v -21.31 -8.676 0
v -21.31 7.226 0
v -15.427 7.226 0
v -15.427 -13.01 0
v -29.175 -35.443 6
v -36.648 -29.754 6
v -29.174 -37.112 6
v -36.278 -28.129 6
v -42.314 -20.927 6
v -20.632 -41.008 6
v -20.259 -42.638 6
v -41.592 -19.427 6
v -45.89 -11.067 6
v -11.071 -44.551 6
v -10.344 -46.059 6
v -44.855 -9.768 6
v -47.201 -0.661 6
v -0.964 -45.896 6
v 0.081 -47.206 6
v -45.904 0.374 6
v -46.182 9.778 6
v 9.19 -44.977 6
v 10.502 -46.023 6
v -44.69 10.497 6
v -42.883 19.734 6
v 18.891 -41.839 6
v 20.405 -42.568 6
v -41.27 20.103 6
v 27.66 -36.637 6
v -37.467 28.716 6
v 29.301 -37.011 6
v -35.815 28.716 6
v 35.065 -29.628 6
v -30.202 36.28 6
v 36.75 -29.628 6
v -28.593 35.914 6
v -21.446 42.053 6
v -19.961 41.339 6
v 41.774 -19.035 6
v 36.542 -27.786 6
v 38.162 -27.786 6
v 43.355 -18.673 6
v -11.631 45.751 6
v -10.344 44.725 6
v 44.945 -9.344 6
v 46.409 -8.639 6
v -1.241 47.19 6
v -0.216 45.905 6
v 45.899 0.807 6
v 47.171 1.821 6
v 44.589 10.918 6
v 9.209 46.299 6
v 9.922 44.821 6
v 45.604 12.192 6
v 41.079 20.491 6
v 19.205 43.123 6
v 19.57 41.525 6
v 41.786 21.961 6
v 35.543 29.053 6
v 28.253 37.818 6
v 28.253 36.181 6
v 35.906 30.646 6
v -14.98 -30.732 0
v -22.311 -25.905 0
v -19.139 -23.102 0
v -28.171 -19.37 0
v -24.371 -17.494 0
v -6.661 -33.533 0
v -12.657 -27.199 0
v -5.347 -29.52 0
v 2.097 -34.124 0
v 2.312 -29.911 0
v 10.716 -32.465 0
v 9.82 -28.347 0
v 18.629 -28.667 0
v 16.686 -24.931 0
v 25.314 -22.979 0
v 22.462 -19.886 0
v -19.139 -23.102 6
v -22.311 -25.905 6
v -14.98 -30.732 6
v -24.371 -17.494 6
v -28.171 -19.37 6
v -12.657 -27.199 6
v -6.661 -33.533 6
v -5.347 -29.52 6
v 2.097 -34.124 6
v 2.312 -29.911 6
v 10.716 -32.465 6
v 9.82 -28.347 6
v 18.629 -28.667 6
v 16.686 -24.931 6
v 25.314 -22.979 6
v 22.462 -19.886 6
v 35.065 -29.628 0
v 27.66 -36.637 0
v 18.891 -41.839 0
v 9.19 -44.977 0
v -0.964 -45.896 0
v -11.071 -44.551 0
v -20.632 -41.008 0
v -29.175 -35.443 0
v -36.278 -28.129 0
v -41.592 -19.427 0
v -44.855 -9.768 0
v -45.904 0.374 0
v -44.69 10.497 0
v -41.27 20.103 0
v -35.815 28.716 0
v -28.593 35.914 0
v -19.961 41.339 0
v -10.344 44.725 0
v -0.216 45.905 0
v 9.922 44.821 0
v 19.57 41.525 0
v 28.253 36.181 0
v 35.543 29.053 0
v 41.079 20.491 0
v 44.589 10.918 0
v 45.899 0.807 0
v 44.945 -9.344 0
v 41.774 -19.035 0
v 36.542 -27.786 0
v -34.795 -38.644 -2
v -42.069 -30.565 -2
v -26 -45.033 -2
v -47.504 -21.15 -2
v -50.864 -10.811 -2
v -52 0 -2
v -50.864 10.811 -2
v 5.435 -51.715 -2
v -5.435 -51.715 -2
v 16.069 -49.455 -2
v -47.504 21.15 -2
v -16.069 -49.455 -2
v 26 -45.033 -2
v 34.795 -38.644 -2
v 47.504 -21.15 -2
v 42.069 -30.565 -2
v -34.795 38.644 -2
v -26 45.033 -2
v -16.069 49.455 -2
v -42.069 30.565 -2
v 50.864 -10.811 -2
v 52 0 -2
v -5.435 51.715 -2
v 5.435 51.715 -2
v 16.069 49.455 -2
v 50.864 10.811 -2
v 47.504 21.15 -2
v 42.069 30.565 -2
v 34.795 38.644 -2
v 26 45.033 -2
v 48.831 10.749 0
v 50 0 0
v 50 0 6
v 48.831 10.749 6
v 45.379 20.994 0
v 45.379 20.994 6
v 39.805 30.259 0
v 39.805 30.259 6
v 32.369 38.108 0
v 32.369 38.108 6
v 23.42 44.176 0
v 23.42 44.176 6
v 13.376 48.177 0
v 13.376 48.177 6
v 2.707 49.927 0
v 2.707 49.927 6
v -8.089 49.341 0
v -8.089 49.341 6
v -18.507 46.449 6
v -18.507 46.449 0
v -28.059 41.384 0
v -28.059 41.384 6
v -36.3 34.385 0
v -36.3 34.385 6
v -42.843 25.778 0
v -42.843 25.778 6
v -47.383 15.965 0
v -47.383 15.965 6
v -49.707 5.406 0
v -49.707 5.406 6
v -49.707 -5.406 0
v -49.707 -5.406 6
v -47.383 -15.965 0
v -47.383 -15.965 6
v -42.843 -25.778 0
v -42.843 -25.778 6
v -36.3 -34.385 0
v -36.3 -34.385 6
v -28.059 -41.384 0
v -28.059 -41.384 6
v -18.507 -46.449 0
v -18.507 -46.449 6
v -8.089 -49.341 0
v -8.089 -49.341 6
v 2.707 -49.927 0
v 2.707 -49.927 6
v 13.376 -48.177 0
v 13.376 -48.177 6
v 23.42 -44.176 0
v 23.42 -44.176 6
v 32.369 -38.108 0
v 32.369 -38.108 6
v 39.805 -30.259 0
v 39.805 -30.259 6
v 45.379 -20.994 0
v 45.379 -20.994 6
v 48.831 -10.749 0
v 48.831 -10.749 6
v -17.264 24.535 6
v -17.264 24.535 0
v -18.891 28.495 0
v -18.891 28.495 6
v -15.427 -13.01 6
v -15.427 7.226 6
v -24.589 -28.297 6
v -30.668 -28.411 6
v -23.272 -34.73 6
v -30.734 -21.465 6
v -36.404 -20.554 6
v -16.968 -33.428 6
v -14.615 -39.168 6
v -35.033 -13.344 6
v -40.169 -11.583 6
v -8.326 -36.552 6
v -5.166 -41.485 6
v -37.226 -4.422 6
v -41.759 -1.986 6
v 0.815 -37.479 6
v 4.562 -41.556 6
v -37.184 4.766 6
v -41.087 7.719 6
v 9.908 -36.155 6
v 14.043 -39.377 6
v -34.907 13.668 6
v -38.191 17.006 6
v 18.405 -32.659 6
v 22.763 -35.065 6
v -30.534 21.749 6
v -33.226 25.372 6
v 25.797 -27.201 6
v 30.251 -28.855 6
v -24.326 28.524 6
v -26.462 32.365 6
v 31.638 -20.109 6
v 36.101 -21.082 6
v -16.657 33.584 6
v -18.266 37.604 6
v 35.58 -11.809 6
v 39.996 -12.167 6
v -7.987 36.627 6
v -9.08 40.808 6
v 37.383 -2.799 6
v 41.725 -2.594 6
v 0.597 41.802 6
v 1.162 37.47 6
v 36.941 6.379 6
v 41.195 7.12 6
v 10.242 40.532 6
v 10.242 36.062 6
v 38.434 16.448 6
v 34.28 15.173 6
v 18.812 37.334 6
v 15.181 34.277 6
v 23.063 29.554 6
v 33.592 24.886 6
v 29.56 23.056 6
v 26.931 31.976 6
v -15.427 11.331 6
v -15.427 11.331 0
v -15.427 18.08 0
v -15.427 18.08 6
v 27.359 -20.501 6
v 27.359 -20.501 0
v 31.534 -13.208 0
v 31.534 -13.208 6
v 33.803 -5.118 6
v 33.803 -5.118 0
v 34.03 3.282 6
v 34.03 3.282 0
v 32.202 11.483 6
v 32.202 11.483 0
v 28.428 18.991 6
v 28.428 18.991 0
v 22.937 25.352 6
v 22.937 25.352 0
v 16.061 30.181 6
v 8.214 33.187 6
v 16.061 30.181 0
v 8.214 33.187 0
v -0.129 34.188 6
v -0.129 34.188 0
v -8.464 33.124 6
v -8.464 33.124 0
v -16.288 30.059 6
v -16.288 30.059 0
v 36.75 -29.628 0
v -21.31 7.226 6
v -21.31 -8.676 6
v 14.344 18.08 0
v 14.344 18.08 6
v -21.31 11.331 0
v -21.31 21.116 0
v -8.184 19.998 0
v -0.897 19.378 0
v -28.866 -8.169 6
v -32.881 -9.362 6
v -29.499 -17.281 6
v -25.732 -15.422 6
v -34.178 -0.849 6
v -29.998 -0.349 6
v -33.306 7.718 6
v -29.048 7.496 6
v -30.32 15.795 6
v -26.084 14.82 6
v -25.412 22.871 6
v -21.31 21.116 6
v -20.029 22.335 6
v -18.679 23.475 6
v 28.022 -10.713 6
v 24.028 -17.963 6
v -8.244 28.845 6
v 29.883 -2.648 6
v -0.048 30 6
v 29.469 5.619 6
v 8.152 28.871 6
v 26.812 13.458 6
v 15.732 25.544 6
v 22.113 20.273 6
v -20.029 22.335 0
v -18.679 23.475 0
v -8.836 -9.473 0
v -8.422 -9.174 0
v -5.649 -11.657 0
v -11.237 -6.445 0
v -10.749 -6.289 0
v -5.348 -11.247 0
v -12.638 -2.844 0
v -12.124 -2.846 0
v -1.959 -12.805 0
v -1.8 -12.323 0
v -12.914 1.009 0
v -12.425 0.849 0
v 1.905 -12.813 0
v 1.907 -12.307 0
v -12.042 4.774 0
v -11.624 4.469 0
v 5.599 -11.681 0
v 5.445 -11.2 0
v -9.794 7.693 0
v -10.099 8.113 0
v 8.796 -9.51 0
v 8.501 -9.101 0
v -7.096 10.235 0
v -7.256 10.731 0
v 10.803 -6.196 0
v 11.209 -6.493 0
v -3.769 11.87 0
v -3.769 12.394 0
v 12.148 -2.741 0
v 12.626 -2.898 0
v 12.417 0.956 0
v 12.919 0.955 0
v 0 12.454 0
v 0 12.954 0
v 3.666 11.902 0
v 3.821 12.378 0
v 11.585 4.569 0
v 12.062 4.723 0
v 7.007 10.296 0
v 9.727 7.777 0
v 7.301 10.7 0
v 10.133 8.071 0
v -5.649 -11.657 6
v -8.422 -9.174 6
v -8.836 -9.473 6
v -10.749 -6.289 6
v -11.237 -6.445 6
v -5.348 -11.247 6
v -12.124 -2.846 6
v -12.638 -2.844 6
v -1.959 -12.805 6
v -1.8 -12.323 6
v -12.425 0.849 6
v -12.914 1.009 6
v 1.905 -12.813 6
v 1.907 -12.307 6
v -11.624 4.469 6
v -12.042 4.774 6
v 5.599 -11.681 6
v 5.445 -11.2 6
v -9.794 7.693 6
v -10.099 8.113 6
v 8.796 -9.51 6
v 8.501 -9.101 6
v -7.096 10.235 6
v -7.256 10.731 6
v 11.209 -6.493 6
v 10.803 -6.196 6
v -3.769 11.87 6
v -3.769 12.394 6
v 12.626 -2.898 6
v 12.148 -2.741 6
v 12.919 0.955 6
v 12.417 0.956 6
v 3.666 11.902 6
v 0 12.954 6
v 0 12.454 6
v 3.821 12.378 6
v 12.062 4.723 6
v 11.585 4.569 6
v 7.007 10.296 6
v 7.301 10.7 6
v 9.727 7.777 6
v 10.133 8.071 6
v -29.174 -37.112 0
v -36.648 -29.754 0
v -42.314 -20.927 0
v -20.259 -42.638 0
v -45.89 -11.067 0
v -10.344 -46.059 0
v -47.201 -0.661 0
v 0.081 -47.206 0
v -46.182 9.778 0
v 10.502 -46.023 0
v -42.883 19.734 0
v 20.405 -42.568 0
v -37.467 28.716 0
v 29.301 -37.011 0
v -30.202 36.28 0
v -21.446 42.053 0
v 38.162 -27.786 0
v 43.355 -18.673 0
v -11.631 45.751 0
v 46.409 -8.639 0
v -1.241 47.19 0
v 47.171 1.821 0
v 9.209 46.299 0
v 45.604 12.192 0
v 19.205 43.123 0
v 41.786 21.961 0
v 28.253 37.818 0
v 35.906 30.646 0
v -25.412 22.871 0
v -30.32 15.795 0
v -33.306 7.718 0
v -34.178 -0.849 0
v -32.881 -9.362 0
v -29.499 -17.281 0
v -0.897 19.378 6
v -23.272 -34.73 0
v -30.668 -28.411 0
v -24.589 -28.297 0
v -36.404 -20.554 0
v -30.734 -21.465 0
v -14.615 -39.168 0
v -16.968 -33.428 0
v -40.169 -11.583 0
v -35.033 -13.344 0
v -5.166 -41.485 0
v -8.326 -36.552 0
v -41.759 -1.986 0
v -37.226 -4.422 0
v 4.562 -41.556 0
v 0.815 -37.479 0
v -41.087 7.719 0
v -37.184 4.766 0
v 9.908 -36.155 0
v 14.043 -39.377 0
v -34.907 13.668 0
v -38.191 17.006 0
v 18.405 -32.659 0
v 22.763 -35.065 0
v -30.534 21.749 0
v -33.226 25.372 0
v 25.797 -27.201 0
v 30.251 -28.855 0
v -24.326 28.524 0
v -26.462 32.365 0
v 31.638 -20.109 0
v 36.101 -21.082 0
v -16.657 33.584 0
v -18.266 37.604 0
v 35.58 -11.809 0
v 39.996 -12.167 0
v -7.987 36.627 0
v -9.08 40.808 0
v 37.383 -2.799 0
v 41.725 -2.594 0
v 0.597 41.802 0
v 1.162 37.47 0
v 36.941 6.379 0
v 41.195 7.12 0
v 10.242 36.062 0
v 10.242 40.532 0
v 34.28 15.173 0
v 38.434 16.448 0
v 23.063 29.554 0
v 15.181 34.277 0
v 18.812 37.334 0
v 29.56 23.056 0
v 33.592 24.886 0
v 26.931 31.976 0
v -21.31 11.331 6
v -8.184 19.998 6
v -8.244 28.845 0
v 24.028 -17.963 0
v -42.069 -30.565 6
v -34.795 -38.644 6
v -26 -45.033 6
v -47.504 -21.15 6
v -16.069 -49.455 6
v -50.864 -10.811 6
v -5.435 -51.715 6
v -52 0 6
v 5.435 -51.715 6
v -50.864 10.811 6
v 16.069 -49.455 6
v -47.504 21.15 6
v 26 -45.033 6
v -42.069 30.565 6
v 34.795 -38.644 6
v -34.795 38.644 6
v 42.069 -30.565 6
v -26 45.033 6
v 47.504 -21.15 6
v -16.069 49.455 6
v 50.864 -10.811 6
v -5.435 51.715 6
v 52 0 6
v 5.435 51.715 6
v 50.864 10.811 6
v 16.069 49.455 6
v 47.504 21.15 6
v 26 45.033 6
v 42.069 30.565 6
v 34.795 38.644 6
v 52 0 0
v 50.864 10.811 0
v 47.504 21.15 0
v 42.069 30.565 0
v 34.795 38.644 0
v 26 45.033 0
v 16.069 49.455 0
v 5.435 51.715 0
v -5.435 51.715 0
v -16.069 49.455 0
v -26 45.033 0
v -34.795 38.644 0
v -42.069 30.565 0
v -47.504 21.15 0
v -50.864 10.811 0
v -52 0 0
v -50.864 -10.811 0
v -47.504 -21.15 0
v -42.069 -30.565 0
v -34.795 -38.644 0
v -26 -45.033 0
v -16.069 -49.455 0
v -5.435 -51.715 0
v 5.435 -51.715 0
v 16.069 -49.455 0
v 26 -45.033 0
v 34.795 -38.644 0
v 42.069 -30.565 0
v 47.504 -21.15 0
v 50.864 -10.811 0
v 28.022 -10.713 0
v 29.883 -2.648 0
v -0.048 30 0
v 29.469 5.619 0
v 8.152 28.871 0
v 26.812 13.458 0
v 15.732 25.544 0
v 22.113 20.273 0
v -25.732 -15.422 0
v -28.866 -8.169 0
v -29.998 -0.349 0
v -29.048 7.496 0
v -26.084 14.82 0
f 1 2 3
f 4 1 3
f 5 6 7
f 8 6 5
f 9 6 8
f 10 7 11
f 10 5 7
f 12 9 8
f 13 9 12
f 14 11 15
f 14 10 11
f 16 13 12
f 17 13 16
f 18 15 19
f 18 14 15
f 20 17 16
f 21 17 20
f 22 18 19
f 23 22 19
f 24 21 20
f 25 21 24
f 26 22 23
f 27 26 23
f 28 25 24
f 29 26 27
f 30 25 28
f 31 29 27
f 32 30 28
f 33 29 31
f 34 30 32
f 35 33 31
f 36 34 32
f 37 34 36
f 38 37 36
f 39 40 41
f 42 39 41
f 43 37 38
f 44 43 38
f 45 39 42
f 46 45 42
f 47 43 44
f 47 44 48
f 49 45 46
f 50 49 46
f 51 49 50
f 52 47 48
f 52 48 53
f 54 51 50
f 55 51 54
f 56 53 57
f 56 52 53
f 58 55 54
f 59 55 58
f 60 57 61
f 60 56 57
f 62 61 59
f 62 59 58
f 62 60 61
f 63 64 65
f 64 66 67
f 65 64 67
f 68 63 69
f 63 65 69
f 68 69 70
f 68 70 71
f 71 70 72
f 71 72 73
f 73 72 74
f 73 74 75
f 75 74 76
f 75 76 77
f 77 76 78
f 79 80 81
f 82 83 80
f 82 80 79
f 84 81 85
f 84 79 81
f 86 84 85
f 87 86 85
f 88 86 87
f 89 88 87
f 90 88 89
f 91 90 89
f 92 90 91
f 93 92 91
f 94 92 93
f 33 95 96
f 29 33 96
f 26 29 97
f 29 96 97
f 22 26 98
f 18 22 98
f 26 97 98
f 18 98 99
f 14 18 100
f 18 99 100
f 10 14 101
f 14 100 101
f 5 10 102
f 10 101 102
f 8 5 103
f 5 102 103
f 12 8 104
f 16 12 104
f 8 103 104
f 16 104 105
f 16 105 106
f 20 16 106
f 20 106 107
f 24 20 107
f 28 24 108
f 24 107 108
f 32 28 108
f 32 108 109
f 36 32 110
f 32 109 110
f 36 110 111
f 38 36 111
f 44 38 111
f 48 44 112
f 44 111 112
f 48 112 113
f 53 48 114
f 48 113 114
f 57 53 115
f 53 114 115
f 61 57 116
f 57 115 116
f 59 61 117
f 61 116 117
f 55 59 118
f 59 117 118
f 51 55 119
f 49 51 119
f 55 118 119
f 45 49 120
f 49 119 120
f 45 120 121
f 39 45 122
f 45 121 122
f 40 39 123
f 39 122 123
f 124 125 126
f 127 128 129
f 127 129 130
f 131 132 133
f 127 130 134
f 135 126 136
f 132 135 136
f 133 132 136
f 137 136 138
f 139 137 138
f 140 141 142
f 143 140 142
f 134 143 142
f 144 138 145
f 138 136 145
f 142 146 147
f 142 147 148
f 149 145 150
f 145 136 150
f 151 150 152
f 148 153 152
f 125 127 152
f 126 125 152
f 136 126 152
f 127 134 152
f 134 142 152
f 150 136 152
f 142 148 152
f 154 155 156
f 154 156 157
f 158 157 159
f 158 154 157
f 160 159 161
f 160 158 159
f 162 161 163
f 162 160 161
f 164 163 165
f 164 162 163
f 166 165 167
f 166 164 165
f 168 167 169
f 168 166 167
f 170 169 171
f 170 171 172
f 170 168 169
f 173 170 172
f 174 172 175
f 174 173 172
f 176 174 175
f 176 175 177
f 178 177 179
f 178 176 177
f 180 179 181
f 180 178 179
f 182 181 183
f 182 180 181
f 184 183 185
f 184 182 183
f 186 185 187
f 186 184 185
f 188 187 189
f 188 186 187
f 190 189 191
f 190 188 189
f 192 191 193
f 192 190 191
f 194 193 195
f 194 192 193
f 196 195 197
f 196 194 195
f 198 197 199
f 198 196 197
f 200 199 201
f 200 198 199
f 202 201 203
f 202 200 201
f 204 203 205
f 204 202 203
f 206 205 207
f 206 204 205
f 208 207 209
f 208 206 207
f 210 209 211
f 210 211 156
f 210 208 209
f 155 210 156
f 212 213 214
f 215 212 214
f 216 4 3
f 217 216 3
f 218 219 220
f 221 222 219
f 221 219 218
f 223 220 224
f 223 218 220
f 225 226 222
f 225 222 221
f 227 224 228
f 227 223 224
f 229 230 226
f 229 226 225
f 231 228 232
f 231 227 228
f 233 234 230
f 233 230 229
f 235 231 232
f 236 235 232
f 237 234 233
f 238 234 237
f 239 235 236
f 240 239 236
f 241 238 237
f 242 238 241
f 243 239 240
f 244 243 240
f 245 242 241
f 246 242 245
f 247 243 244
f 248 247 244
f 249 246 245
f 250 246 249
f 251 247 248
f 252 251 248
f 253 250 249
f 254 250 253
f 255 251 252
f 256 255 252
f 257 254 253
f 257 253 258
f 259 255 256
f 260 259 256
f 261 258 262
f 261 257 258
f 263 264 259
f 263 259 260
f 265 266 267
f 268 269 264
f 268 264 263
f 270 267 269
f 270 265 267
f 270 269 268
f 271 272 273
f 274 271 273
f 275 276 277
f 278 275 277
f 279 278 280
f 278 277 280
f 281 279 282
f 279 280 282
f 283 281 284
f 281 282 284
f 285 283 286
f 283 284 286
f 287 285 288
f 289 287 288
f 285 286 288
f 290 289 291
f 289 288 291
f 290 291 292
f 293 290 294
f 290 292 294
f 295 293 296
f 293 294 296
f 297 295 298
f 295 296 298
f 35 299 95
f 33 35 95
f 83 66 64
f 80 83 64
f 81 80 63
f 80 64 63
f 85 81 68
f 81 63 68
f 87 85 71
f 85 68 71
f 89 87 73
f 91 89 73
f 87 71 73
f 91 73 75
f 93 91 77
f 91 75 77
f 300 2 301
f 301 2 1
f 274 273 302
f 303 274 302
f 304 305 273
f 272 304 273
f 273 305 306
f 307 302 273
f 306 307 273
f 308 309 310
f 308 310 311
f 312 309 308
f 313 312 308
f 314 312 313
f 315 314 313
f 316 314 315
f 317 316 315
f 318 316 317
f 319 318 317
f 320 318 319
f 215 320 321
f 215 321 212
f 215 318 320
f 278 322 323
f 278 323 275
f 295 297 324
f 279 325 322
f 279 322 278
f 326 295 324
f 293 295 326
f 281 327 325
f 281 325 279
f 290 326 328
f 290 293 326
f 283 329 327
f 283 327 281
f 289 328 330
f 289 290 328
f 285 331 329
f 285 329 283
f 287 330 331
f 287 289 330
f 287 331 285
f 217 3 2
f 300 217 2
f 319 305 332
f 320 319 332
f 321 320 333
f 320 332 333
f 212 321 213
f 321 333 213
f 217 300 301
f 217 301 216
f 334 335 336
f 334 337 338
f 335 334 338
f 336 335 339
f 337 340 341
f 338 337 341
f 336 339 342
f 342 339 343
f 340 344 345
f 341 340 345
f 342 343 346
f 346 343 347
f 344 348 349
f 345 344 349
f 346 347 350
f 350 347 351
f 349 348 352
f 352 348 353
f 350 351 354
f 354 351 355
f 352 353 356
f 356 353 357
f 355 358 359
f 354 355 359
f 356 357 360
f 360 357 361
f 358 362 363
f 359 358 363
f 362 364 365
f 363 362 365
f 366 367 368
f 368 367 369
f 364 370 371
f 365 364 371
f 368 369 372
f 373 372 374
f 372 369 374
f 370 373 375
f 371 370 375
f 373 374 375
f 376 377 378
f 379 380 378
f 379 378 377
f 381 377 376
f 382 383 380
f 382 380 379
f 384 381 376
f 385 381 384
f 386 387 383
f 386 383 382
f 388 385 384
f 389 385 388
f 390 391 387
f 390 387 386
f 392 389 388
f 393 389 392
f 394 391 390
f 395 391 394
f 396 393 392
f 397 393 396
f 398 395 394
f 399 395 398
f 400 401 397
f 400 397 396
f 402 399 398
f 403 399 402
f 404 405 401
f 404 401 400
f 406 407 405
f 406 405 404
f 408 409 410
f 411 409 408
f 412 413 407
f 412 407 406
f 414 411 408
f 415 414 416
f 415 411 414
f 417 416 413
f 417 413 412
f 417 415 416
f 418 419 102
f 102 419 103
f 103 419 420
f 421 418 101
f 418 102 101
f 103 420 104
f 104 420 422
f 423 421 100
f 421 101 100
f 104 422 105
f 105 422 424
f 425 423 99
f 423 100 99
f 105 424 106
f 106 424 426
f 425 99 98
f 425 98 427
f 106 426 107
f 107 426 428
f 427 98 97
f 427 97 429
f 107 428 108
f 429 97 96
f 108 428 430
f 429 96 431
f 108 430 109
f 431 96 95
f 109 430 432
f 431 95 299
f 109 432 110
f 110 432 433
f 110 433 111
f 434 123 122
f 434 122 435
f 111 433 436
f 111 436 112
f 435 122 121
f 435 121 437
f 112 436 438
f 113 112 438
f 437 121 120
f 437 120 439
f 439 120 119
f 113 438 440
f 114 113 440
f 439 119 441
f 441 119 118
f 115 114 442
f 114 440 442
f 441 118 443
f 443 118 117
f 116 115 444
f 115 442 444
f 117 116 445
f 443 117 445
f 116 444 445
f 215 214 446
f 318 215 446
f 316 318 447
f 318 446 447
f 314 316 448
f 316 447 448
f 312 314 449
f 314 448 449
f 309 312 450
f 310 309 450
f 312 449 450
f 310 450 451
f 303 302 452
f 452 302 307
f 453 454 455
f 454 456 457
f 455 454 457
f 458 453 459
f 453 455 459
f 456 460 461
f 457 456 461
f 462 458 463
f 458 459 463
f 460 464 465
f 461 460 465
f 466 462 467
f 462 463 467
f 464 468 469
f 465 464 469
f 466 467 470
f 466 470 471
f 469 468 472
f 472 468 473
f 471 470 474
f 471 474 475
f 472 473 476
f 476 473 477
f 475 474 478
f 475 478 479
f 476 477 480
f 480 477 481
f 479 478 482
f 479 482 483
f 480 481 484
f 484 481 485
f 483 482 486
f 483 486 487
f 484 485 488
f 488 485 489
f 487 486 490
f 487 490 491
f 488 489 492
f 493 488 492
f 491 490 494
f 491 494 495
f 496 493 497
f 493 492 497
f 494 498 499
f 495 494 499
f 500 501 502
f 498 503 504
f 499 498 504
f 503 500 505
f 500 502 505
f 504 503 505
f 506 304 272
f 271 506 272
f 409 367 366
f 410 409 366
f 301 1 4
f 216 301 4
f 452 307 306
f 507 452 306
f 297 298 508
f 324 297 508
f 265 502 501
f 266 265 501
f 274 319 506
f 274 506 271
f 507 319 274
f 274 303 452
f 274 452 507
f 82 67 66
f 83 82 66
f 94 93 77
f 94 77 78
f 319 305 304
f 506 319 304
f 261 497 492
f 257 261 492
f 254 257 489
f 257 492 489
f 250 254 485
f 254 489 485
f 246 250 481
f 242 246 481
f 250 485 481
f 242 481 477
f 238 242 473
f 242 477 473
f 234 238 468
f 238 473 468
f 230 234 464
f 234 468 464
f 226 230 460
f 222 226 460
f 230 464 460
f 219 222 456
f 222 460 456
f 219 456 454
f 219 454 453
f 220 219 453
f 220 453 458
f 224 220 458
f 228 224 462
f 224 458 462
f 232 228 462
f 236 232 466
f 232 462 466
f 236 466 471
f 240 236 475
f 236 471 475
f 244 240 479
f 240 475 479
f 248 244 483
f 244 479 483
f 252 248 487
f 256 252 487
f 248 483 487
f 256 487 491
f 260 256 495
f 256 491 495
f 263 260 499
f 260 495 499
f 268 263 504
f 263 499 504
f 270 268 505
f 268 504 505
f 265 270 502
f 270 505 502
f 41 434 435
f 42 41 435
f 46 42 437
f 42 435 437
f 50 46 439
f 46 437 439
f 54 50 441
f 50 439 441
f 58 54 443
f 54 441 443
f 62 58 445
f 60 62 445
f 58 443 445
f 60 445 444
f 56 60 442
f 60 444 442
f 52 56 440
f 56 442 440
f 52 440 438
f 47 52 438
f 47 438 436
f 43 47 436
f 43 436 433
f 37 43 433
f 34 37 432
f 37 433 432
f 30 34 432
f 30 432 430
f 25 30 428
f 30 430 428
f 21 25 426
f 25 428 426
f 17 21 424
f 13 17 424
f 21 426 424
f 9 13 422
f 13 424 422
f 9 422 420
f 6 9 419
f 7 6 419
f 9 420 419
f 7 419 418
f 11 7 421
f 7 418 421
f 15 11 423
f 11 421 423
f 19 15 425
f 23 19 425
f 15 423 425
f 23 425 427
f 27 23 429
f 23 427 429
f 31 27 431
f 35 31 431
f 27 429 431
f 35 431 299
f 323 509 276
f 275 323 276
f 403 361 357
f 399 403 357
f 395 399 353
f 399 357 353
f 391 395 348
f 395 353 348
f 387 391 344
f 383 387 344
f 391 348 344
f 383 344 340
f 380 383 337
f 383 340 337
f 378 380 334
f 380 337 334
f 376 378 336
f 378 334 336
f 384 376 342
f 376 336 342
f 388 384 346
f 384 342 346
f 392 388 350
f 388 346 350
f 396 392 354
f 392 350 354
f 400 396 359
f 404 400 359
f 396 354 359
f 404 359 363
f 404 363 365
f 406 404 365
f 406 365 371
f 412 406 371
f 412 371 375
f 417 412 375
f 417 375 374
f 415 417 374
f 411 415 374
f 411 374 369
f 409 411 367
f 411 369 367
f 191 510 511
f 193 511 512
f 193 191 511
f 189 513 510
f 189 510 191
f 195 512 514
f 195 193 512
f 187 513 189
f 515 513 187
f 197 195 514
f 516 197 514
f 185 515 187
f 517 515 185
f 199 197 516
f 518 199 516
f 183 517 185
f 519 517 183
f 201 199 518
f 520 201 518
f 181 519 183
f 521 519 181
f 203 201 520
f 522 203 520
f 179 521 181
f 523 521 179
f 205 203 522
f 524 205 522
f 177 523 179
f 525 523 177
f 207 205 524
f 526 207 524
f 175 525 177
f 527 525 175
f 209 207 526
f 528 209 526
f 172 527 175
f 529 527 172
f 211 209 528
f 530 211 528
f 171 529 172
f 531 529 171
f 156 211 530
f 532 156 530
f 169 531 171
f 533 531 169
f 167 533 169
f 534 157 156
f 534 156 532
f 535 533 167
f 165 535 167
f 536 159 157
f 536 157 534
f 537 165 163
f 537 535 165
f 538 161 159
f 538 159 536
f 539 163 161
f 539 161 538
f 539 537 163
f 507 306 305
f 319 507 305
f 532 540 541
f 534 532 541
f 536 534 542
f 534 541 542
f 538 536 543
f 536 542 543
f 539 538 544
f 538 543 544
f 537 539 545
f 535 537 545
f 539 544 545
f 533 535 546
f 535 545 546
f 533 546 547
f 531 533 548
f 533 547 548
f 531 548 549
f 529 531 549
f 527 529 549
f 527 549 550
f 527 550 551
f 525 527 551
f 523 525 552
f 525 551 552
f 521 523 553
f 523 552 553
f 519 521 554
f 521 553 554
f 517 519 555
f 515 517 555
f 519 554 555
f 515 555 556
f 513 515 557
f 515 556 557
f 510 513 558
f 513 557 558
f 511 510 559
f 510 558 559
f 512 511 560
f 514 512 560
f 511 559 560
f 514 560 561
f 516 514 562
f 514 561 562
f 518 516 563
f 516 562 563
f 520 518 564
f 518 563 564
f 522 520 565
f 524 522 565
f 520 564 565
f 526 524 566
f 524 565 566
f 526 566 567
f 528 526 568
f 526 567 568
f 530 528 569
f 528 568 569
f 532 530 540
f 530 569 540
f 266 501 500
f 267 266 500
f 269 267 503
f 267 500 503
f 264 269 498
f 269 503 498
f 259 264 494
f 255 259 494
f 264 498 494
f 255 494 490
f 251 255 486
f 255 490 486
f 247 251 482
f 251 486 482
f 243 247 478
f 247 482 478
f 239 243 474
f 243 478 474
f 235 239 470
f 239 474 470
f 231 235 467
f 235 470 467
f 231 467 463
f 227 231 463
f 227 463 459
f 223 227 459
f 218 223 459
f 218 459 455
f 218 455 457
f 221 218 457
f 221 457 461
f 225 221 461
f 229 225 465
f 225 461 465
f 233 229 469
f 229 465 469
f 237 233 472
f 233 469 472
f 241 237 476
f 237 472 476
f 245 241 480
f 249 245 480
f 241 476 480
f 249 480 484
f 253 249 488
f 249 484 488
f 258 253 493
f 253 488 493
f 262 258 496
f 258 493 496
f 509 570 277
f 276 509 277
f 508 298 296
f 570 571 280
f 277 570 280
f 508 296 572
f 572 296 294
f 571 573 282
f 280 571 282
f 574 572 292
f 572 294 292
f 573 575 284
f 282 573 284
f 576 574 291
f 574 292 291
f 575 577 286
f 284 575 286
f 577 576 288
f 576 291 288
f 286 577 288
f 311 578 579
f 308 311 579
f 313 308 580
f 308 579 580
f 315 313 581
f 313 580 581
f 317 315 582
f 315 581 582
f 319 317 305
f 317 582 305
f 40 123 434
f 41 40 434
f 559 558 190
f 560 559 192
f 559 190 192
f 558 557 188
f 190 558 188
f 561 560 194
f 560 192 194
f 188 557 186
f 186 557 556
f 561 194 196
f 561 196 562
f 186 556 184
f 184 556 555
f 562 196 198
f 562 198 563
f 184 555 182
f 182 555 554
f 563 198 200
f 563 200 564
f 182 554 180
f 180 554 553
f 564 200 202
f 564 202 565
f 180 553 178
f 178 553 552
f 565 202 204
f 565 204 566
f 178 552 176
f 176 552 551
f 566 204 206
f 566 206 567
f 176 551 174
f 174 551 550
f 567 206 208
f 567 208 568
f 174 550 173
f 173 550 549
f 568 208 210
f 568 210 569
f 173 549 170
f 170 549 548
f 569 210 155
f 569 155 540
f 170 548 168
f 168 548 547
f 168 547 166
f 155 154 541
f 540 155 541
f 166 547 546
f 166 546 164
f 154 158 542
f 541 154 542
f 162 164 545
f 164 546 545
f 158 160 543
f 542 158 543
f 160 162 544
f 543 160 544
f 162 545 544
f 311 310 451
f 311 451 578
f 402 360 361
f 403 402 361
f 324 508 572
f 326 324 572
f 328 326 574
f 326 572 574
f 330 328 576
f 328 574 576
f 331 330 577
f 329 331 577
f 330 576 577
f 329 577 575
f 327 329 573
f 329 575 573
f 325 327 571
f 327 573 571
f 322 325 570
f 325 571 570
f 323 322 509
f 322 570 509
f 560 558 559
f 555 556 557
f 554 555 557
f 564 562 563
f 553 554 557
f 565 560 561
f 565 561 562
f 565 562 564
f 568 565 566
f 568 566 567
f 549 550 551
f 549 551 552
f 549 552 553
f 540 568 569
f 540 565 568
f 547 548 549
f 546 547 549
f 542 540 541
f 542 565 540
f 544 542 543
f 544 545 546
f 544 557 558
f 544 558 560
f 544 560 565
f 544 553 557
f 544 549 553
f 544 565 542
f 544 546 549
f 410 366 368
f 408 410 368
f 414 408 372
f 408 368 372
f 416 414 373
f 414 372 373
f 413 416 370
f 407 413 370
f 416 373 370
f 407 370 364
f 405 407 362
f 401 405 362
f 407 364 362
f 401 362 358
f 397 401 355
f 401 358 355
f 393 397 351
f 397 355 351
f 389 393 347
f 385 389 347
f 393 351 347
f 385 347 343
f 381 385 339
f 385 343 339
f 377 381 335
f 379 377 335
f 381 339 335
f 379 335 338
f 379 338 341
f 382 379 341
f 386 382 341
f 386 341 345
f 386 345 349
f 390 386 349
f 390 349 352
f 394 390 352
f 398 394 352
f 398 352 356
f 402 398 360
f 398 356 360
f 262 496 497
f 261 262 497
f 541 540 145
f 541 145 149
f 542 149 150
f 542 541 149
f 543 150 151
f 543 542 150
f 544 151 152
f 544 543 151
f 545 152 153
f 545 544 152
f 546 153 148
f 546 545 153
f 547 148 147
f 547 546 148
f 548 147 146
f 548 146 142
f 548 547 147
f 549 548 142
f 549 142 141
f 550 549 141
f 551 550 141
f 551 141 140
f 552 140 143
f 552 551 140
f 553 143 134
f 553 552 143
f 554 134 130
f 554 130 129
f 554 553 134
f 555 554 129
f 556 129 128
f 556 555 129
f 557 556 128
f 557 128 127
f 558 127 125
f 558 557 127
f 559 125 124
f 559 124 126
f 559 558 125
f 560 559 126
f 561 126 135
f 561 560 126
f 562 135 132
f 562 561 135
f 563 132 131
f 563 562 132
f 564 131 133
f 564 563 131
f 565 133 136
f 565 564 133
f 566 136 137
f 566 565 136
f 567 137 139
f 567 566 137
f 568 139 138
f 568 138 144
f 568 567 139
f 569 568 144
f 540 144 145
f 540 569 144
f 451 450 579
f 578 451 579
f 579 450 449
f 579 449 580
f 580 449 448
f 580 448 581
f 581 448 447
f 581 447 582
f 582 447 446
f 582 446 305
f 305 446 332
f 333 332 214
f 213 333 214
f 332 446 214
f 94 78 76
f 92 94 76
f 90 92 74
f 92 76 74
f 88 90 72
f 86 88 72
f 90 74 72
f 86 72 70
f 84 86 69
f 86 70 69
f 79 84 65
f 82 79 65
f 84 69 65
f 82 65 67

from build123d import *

# Parameters (mm, degrees)
F0_R     = 52
F0_R_2   = 50
F1_DEPTH = 6
F2_R     = 52
F3_DEPTH = 2


with BuildPart() as f1:
    # F0 (on Top) → F1 (new body)
    with BuildSketch(Plane.XY):
        Circle(F0_R)
        Circle(F0_R_2, mode=Mode.SUBTRACT)
    extrude(amount=F1_DEPTH)


with BuildPart() as f1b:
    # F0 (on Top) → F1, piece 2 (new body)
    with BuildSketch(Plane.XY):
        with BuildLine():
            Line((36.5417559583, -27.7857985348), (38.1620916175, -27.7857985348))
            ThreePointArc((38.1620916175, -27.7857985348), (-37.4674949788, 28.7155473021), (36.7502520643, -29.6279396862))
            Line((36.7502520643, -29.6279396862), (35.0647361131, -29.6279396862))
            ThreePointArc((35.0647361131, -29.6279396862), (-35.8150917589, 28.7163669539), (36.5417559583, -27.7857985348))
        make_face()
    extrude(amount=F1_DEPTH)


with BuildPart() as f1c:
    # F0 (on Top) → F1, piece 3 (new body)
    with BuildSketch(Plane.XY):
        with BuildLine():
            Line((10.2422153577, 36.061835485), (10.2422153577, 40.5318301831))
            ThreePointArc((10.2422153577, 40.5318301831), (-14.6147039534, -39.1681332435), (18.8117697835, 37.33429457))
            Line((18.8117697835, 37.33429457), (15.1811125025, 34.2767089605))
            ThreePointArc((15.1811125025, 34.2767089605), (-12.7429615494, -35.2558631284), (10.2422153577, 36.061835485))
        make_face()
    extrude(amount=F1_DEPTH)


with BuildPart() as f1d:
    # F0 (on Top) → F1, piece 4 (new body)
    with BuildSketch(Plane.XY):
        with BuildLine():
            ThreePointArc((22.4622340584, -19.8858754171), (-1.5300300705, -29.9609580618), (-24.371140327, -17.4942138767))
            Line((-24.371140327, -17.4942138767), (-28.1714358548, -19.3700175615))
            ThreePointArc((-28.1714358548, -19.3700175615), (-2.3013146195, -34.1105750388), (25.3143372963, -22.9785052973))
            Line((25.3143372963, -22.9785052973), (22.4622340584, -19.8858754171))
        make_face()
    extrude(amount=F1_DEPTH)


with BuildPart() as f1e:
    # F0 (on Top) → F1, piece 5 (new body)
    with BuildSketch(Plane.XY):
        with BuildLine():
            ThreePointArc((-21.3097310738, 21.1162345498), (-19.3625345272, 22.9148915922), (-17.2641651741, 24.5346408337))
            Line((-17.2641651741, 24.5346408337), (-18.8908576965, 28.4949622555))
            ThreePointArc((-18.8908576965, 28.4949622555), (-33.3055166437, 7.7181564864), (-29.4989385309, -17.2812037775))
            Line((-29.4989385309, -17.2812037775), (-25.7324537288, -15.4220888695))
            ThreePointArc((-25.7324537288, -15.4220888695), (-29.7826133394, 3.6049885822), (-21.3097310738, 21.1162345498))
        make_face()
    extrude(amount=F1_DEPTH)


with BuildPart() as f1f:
    # F0 (on Top) → F1, piece 6 (new body)
    with BuildSketch(Plane.XY):
        with BuildLine():
            ThreePointArc((27.3593251844, -20.5010903102), (25.8789836039, 22.3406711198), (-16.2877984734, 30.0588589162))
            Line((-16.2877984734, 30.0588589162), (-8.2441801205, 28.8449907981))
            ThreePointArc((-8.2441801205, 28.8449907981), (24.698796024, 17.0284900965), (24.0275514696, -17.9632060161))
            Line((24.0275514696, -17.9632060161), (27.3593251844, -20.5010903102))
        make_face()
    extrude(amount=F1_DEPTH)


with BuildPart() as f1g:
    # F0 (on Top) → F1, piece 7 (new body)
    with BuildSketch(Plane.XY):
        Polygon((-8.1836236641, 19.998456305), (-21.3097310738, 21.1162345498), (-21.3097310738, 11.3307982683), (-15.4272001237, 11.3307982683), (-15.4272001237, 18.0801004171), (-8.1836236641, 18.0801004171), (-0.8972157375, 18.0801004171), (-0.5501859705, 18.0801004171), (14.3436938524, 18.0801004171), (-0.8972157375, 19.3779685999), align=None)
    extrude(amount=F1_DEPTH)


with BuildPart() as f1h:
    # F0 (on Top) → F1, piece 8 (new body)
    with BuildSketch(Plane.XY):
        Polygon((-21.3097310738, 7.2259628214), (-21.3097310738, -8.6760176346), (-15.4272001237, -13.0097549409), (-15.4272001237, 7.2259628214), align=None)
    extrude(amount=F1_DEPTH)


with BuildPart() as f1i:
    # F0 (on Top) → F1, piece 9 (new body)
    with BuildSketch(Plane.XY):
        with BuildLine():
            ThreePointArc((0, 12.4538803561), (1.9067466055, -12.3070489276), (-3.7685320713, 11.8700169314))
            Line((-3.7685320713, 11.8700169314), (-3.7685320713, 12.3935942881))
            ThreePointArc((-3.7685320713, 12.3935942881), (1.9049773177, -12.8130431502), (0, 12.953880243))
            Line((0, 12.953880243), (0, 12.4538803561))
        make_face()
    extrude(amount=F1_DEPTH)


with BuildPart() as f3:
    # F2 (on Top) → F3 (new body)
    with BuildSketch(Plane.XY):
        Circle(F2_R)
    extrude(amount=-F3_DEPTH)


solid = Compound([f1.part, f1b.part, f1c.part, f1d.part, f1e.part, f1f.part, f1g.part, f1h.part, f1i.part, f3.part])
